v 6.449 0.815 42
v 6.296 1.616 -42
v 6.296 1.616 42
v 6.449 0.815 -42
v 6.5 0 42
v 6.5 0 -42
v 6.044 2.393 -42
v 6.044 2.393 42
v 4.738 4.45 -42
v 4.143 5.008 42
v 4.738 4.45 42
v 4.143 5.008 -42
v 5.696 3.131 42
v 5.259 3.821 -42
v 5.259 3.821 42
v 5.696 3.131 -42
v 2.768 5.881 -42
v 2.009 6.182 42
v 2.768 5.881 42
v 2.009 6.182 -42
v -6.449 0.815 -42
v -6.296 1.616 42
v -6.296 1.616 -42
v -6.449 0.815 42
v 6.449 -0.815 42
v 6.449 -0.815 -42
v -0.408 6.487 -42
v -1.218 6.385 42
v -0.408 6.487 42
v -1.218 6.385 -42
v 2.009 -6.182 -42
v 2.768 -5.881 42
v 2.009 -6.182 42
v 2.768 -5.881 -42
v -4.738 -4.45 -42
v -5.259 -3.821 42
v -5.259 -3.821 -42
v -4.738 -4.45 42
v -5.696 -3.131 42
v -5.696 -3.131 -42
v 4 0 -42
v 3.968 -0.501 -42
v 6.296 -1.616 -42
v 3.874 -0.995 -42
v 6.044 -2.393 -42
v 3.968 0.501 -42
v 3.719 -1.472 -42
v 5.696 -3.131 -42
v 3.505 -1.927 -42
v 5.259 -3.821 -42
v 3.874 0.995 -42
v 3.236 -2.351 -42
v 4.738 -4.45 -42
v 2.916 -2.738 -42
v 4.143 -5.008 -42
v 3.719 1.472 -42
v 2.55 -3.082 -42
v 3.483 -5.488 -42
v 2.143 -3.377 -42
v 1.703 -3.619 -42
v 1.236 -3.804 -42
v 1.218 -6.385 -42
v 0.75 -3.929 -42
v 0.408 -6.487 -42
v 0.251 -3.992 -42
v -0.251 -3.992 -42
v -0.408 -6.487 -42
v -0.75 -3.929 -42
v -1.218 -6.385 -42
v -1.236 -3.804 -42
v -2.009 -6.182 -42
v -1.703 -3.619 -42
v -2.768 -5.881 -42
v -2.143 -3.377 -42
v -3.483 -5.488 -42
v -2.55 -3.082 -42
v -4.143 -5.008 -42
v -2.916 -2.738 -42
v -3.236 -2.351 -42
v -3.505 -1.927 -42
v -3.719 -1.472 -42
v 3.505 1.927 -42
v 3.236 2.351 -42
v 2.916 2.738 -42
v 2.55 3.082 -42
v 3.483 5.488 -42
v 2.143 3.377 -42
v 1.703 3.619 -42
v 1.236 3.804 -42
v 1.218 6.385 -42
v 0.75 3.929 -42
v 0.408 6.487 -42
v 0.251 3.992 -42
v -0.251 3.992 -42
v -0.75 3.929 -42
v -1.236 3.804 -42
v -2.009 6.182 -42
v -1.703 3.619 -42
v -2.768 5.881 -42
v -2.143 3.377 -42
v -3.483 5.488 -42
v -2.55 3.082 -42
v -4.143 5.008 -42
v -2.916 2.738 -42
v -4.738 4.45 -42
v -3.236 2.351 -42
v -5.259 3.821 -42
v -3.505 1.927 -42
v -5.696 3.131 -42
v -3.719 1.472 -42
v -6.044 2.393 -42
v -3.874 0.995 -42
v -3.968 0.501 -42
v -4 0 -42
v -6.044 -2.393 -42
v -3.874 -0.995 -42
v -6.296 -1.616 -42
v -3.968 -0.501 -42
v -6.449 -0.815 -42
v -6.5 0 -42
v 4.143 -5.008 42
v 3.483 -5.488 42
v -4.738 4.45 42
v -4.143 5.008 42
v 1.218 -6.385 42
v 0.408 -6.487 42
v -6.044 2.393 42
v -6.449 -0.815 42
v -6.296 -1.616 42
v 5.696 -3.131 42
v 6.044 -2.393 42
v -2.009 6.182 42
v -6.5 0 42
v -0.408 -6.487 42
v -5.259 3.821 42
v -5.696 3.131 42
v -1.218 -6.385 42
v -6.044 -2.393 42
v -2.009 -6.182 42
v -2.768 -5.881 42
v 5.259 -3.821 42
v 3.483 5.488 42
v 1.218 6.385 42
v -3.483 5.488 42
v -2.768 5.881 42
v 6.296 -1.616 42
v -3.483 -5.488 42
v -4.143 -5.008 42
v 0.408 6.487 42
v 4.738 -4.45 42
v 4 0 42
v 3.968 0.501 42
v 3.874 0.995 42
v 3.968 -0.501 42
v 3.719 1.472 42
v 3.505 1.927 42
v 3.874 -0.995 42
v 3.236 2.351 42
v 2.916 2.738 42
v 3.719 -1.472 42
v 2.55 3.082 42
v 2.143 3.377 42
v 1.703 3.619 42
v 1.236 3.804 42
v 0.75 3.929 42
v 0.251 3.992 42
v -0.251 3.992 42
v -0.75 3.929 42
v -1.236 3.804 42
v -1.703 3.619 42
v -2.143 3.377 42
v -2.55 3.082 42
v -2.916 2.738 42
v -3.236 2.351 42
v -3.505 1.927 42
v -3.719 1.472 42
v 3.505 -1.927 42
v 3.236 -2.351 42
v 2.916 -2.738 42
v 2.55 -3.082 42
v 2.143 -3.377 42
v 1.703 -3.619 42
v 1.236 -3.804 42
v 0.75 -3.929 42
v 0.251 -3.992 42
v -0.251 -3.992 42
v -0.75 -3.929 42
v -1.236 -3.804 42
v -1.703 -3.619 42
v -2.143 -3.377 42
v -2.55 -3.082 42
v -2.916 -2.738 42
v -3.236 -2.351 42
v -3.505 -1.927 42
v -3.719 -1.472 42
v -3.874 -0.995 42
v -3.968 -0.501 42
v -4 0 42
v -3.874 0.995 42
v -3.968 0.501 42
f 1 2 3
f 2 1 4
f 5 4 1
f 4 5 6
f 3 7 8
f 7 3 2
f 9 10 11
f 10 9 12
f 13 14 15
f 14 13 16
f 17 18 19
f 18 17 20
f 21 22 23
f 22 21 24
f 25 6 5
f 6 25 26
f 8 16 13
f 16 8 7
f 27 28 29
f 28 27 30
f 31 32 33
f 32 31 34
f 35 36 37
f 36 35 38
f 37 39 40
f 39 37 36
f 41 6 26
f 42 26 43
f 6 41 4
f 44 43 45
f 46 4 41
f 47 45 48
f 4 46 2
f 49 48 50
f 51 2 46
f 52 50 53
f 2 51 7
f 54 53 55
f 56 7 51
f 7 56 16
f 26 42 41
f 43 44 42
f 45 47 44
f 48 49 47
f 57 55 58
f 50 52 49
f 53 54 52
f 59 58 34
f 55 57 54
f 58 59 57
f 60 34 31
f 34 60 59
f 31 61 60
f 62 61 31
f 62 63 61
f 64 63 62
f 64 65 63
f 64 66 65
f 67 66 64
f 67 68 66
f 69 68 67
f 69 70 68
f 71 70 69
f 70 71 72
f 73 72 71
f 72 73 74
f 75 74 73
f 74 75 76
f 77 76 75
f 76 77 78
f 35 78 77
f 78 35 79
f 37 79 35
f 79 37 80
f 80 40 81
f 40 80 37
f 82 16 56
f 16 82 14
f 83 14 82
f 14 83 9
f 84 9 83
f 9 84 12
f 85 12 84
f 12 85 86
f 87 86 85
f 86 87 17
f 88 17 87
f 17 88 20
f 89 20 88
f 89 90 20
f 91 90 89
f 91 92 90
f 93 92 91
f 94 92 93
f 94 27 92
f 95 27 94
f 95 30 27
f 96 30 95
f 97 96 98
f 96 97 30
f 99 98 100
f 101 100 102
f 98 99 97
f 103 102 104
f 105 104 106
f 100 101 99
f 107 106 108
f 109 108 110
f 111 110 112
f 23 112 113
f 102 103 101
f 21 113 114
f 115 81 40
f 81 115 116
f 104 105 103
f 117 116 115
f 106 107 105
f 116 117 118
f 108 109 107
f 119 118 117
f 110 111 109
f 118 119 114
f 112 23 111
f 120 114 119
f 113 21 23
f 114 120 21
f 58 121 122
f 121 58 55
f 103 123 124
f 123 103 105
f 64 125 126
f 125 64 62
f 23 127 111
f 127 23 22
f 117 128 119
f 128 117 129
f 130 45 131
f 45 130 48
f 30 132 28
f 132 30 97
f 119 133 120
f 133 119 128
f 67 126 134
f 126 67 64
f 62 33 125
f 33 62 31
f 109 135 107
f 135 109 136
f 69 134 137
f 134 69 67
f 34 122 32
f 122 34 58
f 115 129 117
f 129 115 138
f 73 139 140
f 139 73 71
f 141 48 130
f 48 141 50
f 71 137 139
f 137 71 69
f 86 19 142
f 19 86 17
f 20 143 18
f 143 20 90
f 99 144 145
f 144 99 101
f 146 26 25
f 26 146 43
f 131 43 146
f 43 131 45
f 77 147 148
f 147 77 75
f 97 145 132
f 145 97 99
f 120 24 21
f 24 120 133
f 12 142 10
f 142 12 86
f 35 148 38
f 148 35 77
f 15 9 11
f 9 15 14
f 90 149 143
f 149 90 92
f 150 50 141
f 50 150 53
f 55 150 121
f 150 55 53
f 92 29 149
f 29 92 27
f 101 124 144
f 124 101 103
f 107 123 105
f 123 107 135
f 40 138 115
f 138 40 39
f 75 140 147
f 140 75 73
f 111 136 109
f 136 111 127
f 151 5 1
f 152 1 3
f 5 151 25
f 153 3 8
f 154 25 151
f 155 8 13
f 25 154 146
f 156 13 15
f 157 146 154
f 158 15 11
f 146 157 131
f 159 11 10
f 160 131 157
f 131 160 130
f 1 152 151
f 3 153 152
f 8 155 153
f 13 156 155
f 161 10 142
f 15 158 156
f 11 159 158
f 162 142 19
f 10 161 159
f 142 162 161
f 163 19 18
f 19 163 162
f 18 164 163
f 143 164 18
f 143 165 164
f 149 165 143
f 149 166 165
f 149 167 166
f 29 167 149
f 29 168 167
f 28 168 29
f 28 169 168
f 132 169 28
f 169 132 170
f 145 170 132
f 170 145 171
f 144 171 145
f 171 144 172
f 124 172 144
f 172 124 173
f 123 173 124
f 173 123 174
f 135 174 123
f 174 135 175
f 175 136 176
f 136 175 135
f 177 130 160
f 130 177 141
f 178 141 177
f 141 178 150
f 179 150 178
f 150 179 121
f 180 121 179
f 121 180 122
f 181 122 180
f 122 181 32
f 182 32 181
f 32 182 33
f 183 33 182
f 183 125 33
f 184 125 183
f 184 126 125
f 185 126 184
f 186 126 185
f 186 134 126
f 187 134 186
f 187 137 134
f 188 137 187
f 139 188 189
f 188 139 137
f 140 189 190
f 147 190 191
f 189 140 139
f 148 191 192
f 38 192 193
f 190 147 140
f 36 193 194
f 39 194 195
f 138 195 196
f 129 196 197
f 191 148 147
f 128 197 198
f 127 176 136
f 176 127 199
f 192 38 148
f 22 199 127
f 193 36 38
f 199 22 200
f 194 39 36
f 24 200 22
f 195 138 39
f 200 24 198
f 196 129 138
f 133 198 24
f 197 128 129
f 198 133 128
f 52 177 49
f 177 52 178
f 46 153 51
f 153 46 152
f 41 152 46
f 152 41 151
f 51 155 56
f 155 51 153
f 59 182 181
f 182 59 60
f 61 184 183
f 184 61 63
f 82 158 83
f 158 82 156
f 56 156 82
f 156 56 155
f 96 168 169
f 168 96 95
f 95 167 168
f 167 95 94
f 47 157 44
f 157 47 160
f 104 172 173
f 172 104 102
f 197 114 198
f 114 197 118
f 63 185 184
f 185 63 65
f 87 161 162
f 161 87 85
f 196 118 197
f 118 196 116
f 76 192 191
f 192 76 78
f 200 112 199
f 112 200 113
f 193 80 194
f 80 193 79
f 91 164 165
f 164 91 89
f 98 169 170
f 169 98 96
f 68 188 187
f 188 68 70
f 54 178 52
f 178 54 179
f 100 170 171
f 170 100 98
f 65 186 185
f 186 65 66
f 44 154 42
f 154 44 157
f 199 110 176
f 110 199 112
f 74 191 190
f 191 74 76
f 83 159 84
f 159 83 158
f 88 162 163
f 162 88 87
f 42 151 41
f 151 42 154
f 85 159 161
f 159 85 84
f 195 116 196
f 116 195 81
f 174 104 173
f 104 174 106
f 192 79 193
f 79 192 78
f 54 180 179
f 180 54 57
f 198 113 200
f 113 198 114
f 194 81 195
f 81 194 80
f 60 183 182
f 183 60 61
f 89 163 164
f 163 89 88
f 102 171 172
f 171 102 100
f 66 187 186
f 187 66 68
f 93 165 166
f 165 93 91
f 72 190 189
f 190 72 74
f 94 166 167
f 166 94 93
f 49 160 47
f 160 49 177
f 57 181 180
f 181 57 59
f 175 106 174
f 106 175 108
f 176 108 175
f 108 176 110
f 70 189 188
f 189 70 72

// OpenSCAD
$fn = 50;


difference() {
	union() {
		translate(v = [0, 0, -42.0000000000]) {
			cylinder(h = 84, r = 6.5000000000);
		}
	}
	union() {
		translate(v = [0, 0, -100.0000000000]) {
			cylinder(h = 200, r = 4.0000000000);
		}
	}
}
